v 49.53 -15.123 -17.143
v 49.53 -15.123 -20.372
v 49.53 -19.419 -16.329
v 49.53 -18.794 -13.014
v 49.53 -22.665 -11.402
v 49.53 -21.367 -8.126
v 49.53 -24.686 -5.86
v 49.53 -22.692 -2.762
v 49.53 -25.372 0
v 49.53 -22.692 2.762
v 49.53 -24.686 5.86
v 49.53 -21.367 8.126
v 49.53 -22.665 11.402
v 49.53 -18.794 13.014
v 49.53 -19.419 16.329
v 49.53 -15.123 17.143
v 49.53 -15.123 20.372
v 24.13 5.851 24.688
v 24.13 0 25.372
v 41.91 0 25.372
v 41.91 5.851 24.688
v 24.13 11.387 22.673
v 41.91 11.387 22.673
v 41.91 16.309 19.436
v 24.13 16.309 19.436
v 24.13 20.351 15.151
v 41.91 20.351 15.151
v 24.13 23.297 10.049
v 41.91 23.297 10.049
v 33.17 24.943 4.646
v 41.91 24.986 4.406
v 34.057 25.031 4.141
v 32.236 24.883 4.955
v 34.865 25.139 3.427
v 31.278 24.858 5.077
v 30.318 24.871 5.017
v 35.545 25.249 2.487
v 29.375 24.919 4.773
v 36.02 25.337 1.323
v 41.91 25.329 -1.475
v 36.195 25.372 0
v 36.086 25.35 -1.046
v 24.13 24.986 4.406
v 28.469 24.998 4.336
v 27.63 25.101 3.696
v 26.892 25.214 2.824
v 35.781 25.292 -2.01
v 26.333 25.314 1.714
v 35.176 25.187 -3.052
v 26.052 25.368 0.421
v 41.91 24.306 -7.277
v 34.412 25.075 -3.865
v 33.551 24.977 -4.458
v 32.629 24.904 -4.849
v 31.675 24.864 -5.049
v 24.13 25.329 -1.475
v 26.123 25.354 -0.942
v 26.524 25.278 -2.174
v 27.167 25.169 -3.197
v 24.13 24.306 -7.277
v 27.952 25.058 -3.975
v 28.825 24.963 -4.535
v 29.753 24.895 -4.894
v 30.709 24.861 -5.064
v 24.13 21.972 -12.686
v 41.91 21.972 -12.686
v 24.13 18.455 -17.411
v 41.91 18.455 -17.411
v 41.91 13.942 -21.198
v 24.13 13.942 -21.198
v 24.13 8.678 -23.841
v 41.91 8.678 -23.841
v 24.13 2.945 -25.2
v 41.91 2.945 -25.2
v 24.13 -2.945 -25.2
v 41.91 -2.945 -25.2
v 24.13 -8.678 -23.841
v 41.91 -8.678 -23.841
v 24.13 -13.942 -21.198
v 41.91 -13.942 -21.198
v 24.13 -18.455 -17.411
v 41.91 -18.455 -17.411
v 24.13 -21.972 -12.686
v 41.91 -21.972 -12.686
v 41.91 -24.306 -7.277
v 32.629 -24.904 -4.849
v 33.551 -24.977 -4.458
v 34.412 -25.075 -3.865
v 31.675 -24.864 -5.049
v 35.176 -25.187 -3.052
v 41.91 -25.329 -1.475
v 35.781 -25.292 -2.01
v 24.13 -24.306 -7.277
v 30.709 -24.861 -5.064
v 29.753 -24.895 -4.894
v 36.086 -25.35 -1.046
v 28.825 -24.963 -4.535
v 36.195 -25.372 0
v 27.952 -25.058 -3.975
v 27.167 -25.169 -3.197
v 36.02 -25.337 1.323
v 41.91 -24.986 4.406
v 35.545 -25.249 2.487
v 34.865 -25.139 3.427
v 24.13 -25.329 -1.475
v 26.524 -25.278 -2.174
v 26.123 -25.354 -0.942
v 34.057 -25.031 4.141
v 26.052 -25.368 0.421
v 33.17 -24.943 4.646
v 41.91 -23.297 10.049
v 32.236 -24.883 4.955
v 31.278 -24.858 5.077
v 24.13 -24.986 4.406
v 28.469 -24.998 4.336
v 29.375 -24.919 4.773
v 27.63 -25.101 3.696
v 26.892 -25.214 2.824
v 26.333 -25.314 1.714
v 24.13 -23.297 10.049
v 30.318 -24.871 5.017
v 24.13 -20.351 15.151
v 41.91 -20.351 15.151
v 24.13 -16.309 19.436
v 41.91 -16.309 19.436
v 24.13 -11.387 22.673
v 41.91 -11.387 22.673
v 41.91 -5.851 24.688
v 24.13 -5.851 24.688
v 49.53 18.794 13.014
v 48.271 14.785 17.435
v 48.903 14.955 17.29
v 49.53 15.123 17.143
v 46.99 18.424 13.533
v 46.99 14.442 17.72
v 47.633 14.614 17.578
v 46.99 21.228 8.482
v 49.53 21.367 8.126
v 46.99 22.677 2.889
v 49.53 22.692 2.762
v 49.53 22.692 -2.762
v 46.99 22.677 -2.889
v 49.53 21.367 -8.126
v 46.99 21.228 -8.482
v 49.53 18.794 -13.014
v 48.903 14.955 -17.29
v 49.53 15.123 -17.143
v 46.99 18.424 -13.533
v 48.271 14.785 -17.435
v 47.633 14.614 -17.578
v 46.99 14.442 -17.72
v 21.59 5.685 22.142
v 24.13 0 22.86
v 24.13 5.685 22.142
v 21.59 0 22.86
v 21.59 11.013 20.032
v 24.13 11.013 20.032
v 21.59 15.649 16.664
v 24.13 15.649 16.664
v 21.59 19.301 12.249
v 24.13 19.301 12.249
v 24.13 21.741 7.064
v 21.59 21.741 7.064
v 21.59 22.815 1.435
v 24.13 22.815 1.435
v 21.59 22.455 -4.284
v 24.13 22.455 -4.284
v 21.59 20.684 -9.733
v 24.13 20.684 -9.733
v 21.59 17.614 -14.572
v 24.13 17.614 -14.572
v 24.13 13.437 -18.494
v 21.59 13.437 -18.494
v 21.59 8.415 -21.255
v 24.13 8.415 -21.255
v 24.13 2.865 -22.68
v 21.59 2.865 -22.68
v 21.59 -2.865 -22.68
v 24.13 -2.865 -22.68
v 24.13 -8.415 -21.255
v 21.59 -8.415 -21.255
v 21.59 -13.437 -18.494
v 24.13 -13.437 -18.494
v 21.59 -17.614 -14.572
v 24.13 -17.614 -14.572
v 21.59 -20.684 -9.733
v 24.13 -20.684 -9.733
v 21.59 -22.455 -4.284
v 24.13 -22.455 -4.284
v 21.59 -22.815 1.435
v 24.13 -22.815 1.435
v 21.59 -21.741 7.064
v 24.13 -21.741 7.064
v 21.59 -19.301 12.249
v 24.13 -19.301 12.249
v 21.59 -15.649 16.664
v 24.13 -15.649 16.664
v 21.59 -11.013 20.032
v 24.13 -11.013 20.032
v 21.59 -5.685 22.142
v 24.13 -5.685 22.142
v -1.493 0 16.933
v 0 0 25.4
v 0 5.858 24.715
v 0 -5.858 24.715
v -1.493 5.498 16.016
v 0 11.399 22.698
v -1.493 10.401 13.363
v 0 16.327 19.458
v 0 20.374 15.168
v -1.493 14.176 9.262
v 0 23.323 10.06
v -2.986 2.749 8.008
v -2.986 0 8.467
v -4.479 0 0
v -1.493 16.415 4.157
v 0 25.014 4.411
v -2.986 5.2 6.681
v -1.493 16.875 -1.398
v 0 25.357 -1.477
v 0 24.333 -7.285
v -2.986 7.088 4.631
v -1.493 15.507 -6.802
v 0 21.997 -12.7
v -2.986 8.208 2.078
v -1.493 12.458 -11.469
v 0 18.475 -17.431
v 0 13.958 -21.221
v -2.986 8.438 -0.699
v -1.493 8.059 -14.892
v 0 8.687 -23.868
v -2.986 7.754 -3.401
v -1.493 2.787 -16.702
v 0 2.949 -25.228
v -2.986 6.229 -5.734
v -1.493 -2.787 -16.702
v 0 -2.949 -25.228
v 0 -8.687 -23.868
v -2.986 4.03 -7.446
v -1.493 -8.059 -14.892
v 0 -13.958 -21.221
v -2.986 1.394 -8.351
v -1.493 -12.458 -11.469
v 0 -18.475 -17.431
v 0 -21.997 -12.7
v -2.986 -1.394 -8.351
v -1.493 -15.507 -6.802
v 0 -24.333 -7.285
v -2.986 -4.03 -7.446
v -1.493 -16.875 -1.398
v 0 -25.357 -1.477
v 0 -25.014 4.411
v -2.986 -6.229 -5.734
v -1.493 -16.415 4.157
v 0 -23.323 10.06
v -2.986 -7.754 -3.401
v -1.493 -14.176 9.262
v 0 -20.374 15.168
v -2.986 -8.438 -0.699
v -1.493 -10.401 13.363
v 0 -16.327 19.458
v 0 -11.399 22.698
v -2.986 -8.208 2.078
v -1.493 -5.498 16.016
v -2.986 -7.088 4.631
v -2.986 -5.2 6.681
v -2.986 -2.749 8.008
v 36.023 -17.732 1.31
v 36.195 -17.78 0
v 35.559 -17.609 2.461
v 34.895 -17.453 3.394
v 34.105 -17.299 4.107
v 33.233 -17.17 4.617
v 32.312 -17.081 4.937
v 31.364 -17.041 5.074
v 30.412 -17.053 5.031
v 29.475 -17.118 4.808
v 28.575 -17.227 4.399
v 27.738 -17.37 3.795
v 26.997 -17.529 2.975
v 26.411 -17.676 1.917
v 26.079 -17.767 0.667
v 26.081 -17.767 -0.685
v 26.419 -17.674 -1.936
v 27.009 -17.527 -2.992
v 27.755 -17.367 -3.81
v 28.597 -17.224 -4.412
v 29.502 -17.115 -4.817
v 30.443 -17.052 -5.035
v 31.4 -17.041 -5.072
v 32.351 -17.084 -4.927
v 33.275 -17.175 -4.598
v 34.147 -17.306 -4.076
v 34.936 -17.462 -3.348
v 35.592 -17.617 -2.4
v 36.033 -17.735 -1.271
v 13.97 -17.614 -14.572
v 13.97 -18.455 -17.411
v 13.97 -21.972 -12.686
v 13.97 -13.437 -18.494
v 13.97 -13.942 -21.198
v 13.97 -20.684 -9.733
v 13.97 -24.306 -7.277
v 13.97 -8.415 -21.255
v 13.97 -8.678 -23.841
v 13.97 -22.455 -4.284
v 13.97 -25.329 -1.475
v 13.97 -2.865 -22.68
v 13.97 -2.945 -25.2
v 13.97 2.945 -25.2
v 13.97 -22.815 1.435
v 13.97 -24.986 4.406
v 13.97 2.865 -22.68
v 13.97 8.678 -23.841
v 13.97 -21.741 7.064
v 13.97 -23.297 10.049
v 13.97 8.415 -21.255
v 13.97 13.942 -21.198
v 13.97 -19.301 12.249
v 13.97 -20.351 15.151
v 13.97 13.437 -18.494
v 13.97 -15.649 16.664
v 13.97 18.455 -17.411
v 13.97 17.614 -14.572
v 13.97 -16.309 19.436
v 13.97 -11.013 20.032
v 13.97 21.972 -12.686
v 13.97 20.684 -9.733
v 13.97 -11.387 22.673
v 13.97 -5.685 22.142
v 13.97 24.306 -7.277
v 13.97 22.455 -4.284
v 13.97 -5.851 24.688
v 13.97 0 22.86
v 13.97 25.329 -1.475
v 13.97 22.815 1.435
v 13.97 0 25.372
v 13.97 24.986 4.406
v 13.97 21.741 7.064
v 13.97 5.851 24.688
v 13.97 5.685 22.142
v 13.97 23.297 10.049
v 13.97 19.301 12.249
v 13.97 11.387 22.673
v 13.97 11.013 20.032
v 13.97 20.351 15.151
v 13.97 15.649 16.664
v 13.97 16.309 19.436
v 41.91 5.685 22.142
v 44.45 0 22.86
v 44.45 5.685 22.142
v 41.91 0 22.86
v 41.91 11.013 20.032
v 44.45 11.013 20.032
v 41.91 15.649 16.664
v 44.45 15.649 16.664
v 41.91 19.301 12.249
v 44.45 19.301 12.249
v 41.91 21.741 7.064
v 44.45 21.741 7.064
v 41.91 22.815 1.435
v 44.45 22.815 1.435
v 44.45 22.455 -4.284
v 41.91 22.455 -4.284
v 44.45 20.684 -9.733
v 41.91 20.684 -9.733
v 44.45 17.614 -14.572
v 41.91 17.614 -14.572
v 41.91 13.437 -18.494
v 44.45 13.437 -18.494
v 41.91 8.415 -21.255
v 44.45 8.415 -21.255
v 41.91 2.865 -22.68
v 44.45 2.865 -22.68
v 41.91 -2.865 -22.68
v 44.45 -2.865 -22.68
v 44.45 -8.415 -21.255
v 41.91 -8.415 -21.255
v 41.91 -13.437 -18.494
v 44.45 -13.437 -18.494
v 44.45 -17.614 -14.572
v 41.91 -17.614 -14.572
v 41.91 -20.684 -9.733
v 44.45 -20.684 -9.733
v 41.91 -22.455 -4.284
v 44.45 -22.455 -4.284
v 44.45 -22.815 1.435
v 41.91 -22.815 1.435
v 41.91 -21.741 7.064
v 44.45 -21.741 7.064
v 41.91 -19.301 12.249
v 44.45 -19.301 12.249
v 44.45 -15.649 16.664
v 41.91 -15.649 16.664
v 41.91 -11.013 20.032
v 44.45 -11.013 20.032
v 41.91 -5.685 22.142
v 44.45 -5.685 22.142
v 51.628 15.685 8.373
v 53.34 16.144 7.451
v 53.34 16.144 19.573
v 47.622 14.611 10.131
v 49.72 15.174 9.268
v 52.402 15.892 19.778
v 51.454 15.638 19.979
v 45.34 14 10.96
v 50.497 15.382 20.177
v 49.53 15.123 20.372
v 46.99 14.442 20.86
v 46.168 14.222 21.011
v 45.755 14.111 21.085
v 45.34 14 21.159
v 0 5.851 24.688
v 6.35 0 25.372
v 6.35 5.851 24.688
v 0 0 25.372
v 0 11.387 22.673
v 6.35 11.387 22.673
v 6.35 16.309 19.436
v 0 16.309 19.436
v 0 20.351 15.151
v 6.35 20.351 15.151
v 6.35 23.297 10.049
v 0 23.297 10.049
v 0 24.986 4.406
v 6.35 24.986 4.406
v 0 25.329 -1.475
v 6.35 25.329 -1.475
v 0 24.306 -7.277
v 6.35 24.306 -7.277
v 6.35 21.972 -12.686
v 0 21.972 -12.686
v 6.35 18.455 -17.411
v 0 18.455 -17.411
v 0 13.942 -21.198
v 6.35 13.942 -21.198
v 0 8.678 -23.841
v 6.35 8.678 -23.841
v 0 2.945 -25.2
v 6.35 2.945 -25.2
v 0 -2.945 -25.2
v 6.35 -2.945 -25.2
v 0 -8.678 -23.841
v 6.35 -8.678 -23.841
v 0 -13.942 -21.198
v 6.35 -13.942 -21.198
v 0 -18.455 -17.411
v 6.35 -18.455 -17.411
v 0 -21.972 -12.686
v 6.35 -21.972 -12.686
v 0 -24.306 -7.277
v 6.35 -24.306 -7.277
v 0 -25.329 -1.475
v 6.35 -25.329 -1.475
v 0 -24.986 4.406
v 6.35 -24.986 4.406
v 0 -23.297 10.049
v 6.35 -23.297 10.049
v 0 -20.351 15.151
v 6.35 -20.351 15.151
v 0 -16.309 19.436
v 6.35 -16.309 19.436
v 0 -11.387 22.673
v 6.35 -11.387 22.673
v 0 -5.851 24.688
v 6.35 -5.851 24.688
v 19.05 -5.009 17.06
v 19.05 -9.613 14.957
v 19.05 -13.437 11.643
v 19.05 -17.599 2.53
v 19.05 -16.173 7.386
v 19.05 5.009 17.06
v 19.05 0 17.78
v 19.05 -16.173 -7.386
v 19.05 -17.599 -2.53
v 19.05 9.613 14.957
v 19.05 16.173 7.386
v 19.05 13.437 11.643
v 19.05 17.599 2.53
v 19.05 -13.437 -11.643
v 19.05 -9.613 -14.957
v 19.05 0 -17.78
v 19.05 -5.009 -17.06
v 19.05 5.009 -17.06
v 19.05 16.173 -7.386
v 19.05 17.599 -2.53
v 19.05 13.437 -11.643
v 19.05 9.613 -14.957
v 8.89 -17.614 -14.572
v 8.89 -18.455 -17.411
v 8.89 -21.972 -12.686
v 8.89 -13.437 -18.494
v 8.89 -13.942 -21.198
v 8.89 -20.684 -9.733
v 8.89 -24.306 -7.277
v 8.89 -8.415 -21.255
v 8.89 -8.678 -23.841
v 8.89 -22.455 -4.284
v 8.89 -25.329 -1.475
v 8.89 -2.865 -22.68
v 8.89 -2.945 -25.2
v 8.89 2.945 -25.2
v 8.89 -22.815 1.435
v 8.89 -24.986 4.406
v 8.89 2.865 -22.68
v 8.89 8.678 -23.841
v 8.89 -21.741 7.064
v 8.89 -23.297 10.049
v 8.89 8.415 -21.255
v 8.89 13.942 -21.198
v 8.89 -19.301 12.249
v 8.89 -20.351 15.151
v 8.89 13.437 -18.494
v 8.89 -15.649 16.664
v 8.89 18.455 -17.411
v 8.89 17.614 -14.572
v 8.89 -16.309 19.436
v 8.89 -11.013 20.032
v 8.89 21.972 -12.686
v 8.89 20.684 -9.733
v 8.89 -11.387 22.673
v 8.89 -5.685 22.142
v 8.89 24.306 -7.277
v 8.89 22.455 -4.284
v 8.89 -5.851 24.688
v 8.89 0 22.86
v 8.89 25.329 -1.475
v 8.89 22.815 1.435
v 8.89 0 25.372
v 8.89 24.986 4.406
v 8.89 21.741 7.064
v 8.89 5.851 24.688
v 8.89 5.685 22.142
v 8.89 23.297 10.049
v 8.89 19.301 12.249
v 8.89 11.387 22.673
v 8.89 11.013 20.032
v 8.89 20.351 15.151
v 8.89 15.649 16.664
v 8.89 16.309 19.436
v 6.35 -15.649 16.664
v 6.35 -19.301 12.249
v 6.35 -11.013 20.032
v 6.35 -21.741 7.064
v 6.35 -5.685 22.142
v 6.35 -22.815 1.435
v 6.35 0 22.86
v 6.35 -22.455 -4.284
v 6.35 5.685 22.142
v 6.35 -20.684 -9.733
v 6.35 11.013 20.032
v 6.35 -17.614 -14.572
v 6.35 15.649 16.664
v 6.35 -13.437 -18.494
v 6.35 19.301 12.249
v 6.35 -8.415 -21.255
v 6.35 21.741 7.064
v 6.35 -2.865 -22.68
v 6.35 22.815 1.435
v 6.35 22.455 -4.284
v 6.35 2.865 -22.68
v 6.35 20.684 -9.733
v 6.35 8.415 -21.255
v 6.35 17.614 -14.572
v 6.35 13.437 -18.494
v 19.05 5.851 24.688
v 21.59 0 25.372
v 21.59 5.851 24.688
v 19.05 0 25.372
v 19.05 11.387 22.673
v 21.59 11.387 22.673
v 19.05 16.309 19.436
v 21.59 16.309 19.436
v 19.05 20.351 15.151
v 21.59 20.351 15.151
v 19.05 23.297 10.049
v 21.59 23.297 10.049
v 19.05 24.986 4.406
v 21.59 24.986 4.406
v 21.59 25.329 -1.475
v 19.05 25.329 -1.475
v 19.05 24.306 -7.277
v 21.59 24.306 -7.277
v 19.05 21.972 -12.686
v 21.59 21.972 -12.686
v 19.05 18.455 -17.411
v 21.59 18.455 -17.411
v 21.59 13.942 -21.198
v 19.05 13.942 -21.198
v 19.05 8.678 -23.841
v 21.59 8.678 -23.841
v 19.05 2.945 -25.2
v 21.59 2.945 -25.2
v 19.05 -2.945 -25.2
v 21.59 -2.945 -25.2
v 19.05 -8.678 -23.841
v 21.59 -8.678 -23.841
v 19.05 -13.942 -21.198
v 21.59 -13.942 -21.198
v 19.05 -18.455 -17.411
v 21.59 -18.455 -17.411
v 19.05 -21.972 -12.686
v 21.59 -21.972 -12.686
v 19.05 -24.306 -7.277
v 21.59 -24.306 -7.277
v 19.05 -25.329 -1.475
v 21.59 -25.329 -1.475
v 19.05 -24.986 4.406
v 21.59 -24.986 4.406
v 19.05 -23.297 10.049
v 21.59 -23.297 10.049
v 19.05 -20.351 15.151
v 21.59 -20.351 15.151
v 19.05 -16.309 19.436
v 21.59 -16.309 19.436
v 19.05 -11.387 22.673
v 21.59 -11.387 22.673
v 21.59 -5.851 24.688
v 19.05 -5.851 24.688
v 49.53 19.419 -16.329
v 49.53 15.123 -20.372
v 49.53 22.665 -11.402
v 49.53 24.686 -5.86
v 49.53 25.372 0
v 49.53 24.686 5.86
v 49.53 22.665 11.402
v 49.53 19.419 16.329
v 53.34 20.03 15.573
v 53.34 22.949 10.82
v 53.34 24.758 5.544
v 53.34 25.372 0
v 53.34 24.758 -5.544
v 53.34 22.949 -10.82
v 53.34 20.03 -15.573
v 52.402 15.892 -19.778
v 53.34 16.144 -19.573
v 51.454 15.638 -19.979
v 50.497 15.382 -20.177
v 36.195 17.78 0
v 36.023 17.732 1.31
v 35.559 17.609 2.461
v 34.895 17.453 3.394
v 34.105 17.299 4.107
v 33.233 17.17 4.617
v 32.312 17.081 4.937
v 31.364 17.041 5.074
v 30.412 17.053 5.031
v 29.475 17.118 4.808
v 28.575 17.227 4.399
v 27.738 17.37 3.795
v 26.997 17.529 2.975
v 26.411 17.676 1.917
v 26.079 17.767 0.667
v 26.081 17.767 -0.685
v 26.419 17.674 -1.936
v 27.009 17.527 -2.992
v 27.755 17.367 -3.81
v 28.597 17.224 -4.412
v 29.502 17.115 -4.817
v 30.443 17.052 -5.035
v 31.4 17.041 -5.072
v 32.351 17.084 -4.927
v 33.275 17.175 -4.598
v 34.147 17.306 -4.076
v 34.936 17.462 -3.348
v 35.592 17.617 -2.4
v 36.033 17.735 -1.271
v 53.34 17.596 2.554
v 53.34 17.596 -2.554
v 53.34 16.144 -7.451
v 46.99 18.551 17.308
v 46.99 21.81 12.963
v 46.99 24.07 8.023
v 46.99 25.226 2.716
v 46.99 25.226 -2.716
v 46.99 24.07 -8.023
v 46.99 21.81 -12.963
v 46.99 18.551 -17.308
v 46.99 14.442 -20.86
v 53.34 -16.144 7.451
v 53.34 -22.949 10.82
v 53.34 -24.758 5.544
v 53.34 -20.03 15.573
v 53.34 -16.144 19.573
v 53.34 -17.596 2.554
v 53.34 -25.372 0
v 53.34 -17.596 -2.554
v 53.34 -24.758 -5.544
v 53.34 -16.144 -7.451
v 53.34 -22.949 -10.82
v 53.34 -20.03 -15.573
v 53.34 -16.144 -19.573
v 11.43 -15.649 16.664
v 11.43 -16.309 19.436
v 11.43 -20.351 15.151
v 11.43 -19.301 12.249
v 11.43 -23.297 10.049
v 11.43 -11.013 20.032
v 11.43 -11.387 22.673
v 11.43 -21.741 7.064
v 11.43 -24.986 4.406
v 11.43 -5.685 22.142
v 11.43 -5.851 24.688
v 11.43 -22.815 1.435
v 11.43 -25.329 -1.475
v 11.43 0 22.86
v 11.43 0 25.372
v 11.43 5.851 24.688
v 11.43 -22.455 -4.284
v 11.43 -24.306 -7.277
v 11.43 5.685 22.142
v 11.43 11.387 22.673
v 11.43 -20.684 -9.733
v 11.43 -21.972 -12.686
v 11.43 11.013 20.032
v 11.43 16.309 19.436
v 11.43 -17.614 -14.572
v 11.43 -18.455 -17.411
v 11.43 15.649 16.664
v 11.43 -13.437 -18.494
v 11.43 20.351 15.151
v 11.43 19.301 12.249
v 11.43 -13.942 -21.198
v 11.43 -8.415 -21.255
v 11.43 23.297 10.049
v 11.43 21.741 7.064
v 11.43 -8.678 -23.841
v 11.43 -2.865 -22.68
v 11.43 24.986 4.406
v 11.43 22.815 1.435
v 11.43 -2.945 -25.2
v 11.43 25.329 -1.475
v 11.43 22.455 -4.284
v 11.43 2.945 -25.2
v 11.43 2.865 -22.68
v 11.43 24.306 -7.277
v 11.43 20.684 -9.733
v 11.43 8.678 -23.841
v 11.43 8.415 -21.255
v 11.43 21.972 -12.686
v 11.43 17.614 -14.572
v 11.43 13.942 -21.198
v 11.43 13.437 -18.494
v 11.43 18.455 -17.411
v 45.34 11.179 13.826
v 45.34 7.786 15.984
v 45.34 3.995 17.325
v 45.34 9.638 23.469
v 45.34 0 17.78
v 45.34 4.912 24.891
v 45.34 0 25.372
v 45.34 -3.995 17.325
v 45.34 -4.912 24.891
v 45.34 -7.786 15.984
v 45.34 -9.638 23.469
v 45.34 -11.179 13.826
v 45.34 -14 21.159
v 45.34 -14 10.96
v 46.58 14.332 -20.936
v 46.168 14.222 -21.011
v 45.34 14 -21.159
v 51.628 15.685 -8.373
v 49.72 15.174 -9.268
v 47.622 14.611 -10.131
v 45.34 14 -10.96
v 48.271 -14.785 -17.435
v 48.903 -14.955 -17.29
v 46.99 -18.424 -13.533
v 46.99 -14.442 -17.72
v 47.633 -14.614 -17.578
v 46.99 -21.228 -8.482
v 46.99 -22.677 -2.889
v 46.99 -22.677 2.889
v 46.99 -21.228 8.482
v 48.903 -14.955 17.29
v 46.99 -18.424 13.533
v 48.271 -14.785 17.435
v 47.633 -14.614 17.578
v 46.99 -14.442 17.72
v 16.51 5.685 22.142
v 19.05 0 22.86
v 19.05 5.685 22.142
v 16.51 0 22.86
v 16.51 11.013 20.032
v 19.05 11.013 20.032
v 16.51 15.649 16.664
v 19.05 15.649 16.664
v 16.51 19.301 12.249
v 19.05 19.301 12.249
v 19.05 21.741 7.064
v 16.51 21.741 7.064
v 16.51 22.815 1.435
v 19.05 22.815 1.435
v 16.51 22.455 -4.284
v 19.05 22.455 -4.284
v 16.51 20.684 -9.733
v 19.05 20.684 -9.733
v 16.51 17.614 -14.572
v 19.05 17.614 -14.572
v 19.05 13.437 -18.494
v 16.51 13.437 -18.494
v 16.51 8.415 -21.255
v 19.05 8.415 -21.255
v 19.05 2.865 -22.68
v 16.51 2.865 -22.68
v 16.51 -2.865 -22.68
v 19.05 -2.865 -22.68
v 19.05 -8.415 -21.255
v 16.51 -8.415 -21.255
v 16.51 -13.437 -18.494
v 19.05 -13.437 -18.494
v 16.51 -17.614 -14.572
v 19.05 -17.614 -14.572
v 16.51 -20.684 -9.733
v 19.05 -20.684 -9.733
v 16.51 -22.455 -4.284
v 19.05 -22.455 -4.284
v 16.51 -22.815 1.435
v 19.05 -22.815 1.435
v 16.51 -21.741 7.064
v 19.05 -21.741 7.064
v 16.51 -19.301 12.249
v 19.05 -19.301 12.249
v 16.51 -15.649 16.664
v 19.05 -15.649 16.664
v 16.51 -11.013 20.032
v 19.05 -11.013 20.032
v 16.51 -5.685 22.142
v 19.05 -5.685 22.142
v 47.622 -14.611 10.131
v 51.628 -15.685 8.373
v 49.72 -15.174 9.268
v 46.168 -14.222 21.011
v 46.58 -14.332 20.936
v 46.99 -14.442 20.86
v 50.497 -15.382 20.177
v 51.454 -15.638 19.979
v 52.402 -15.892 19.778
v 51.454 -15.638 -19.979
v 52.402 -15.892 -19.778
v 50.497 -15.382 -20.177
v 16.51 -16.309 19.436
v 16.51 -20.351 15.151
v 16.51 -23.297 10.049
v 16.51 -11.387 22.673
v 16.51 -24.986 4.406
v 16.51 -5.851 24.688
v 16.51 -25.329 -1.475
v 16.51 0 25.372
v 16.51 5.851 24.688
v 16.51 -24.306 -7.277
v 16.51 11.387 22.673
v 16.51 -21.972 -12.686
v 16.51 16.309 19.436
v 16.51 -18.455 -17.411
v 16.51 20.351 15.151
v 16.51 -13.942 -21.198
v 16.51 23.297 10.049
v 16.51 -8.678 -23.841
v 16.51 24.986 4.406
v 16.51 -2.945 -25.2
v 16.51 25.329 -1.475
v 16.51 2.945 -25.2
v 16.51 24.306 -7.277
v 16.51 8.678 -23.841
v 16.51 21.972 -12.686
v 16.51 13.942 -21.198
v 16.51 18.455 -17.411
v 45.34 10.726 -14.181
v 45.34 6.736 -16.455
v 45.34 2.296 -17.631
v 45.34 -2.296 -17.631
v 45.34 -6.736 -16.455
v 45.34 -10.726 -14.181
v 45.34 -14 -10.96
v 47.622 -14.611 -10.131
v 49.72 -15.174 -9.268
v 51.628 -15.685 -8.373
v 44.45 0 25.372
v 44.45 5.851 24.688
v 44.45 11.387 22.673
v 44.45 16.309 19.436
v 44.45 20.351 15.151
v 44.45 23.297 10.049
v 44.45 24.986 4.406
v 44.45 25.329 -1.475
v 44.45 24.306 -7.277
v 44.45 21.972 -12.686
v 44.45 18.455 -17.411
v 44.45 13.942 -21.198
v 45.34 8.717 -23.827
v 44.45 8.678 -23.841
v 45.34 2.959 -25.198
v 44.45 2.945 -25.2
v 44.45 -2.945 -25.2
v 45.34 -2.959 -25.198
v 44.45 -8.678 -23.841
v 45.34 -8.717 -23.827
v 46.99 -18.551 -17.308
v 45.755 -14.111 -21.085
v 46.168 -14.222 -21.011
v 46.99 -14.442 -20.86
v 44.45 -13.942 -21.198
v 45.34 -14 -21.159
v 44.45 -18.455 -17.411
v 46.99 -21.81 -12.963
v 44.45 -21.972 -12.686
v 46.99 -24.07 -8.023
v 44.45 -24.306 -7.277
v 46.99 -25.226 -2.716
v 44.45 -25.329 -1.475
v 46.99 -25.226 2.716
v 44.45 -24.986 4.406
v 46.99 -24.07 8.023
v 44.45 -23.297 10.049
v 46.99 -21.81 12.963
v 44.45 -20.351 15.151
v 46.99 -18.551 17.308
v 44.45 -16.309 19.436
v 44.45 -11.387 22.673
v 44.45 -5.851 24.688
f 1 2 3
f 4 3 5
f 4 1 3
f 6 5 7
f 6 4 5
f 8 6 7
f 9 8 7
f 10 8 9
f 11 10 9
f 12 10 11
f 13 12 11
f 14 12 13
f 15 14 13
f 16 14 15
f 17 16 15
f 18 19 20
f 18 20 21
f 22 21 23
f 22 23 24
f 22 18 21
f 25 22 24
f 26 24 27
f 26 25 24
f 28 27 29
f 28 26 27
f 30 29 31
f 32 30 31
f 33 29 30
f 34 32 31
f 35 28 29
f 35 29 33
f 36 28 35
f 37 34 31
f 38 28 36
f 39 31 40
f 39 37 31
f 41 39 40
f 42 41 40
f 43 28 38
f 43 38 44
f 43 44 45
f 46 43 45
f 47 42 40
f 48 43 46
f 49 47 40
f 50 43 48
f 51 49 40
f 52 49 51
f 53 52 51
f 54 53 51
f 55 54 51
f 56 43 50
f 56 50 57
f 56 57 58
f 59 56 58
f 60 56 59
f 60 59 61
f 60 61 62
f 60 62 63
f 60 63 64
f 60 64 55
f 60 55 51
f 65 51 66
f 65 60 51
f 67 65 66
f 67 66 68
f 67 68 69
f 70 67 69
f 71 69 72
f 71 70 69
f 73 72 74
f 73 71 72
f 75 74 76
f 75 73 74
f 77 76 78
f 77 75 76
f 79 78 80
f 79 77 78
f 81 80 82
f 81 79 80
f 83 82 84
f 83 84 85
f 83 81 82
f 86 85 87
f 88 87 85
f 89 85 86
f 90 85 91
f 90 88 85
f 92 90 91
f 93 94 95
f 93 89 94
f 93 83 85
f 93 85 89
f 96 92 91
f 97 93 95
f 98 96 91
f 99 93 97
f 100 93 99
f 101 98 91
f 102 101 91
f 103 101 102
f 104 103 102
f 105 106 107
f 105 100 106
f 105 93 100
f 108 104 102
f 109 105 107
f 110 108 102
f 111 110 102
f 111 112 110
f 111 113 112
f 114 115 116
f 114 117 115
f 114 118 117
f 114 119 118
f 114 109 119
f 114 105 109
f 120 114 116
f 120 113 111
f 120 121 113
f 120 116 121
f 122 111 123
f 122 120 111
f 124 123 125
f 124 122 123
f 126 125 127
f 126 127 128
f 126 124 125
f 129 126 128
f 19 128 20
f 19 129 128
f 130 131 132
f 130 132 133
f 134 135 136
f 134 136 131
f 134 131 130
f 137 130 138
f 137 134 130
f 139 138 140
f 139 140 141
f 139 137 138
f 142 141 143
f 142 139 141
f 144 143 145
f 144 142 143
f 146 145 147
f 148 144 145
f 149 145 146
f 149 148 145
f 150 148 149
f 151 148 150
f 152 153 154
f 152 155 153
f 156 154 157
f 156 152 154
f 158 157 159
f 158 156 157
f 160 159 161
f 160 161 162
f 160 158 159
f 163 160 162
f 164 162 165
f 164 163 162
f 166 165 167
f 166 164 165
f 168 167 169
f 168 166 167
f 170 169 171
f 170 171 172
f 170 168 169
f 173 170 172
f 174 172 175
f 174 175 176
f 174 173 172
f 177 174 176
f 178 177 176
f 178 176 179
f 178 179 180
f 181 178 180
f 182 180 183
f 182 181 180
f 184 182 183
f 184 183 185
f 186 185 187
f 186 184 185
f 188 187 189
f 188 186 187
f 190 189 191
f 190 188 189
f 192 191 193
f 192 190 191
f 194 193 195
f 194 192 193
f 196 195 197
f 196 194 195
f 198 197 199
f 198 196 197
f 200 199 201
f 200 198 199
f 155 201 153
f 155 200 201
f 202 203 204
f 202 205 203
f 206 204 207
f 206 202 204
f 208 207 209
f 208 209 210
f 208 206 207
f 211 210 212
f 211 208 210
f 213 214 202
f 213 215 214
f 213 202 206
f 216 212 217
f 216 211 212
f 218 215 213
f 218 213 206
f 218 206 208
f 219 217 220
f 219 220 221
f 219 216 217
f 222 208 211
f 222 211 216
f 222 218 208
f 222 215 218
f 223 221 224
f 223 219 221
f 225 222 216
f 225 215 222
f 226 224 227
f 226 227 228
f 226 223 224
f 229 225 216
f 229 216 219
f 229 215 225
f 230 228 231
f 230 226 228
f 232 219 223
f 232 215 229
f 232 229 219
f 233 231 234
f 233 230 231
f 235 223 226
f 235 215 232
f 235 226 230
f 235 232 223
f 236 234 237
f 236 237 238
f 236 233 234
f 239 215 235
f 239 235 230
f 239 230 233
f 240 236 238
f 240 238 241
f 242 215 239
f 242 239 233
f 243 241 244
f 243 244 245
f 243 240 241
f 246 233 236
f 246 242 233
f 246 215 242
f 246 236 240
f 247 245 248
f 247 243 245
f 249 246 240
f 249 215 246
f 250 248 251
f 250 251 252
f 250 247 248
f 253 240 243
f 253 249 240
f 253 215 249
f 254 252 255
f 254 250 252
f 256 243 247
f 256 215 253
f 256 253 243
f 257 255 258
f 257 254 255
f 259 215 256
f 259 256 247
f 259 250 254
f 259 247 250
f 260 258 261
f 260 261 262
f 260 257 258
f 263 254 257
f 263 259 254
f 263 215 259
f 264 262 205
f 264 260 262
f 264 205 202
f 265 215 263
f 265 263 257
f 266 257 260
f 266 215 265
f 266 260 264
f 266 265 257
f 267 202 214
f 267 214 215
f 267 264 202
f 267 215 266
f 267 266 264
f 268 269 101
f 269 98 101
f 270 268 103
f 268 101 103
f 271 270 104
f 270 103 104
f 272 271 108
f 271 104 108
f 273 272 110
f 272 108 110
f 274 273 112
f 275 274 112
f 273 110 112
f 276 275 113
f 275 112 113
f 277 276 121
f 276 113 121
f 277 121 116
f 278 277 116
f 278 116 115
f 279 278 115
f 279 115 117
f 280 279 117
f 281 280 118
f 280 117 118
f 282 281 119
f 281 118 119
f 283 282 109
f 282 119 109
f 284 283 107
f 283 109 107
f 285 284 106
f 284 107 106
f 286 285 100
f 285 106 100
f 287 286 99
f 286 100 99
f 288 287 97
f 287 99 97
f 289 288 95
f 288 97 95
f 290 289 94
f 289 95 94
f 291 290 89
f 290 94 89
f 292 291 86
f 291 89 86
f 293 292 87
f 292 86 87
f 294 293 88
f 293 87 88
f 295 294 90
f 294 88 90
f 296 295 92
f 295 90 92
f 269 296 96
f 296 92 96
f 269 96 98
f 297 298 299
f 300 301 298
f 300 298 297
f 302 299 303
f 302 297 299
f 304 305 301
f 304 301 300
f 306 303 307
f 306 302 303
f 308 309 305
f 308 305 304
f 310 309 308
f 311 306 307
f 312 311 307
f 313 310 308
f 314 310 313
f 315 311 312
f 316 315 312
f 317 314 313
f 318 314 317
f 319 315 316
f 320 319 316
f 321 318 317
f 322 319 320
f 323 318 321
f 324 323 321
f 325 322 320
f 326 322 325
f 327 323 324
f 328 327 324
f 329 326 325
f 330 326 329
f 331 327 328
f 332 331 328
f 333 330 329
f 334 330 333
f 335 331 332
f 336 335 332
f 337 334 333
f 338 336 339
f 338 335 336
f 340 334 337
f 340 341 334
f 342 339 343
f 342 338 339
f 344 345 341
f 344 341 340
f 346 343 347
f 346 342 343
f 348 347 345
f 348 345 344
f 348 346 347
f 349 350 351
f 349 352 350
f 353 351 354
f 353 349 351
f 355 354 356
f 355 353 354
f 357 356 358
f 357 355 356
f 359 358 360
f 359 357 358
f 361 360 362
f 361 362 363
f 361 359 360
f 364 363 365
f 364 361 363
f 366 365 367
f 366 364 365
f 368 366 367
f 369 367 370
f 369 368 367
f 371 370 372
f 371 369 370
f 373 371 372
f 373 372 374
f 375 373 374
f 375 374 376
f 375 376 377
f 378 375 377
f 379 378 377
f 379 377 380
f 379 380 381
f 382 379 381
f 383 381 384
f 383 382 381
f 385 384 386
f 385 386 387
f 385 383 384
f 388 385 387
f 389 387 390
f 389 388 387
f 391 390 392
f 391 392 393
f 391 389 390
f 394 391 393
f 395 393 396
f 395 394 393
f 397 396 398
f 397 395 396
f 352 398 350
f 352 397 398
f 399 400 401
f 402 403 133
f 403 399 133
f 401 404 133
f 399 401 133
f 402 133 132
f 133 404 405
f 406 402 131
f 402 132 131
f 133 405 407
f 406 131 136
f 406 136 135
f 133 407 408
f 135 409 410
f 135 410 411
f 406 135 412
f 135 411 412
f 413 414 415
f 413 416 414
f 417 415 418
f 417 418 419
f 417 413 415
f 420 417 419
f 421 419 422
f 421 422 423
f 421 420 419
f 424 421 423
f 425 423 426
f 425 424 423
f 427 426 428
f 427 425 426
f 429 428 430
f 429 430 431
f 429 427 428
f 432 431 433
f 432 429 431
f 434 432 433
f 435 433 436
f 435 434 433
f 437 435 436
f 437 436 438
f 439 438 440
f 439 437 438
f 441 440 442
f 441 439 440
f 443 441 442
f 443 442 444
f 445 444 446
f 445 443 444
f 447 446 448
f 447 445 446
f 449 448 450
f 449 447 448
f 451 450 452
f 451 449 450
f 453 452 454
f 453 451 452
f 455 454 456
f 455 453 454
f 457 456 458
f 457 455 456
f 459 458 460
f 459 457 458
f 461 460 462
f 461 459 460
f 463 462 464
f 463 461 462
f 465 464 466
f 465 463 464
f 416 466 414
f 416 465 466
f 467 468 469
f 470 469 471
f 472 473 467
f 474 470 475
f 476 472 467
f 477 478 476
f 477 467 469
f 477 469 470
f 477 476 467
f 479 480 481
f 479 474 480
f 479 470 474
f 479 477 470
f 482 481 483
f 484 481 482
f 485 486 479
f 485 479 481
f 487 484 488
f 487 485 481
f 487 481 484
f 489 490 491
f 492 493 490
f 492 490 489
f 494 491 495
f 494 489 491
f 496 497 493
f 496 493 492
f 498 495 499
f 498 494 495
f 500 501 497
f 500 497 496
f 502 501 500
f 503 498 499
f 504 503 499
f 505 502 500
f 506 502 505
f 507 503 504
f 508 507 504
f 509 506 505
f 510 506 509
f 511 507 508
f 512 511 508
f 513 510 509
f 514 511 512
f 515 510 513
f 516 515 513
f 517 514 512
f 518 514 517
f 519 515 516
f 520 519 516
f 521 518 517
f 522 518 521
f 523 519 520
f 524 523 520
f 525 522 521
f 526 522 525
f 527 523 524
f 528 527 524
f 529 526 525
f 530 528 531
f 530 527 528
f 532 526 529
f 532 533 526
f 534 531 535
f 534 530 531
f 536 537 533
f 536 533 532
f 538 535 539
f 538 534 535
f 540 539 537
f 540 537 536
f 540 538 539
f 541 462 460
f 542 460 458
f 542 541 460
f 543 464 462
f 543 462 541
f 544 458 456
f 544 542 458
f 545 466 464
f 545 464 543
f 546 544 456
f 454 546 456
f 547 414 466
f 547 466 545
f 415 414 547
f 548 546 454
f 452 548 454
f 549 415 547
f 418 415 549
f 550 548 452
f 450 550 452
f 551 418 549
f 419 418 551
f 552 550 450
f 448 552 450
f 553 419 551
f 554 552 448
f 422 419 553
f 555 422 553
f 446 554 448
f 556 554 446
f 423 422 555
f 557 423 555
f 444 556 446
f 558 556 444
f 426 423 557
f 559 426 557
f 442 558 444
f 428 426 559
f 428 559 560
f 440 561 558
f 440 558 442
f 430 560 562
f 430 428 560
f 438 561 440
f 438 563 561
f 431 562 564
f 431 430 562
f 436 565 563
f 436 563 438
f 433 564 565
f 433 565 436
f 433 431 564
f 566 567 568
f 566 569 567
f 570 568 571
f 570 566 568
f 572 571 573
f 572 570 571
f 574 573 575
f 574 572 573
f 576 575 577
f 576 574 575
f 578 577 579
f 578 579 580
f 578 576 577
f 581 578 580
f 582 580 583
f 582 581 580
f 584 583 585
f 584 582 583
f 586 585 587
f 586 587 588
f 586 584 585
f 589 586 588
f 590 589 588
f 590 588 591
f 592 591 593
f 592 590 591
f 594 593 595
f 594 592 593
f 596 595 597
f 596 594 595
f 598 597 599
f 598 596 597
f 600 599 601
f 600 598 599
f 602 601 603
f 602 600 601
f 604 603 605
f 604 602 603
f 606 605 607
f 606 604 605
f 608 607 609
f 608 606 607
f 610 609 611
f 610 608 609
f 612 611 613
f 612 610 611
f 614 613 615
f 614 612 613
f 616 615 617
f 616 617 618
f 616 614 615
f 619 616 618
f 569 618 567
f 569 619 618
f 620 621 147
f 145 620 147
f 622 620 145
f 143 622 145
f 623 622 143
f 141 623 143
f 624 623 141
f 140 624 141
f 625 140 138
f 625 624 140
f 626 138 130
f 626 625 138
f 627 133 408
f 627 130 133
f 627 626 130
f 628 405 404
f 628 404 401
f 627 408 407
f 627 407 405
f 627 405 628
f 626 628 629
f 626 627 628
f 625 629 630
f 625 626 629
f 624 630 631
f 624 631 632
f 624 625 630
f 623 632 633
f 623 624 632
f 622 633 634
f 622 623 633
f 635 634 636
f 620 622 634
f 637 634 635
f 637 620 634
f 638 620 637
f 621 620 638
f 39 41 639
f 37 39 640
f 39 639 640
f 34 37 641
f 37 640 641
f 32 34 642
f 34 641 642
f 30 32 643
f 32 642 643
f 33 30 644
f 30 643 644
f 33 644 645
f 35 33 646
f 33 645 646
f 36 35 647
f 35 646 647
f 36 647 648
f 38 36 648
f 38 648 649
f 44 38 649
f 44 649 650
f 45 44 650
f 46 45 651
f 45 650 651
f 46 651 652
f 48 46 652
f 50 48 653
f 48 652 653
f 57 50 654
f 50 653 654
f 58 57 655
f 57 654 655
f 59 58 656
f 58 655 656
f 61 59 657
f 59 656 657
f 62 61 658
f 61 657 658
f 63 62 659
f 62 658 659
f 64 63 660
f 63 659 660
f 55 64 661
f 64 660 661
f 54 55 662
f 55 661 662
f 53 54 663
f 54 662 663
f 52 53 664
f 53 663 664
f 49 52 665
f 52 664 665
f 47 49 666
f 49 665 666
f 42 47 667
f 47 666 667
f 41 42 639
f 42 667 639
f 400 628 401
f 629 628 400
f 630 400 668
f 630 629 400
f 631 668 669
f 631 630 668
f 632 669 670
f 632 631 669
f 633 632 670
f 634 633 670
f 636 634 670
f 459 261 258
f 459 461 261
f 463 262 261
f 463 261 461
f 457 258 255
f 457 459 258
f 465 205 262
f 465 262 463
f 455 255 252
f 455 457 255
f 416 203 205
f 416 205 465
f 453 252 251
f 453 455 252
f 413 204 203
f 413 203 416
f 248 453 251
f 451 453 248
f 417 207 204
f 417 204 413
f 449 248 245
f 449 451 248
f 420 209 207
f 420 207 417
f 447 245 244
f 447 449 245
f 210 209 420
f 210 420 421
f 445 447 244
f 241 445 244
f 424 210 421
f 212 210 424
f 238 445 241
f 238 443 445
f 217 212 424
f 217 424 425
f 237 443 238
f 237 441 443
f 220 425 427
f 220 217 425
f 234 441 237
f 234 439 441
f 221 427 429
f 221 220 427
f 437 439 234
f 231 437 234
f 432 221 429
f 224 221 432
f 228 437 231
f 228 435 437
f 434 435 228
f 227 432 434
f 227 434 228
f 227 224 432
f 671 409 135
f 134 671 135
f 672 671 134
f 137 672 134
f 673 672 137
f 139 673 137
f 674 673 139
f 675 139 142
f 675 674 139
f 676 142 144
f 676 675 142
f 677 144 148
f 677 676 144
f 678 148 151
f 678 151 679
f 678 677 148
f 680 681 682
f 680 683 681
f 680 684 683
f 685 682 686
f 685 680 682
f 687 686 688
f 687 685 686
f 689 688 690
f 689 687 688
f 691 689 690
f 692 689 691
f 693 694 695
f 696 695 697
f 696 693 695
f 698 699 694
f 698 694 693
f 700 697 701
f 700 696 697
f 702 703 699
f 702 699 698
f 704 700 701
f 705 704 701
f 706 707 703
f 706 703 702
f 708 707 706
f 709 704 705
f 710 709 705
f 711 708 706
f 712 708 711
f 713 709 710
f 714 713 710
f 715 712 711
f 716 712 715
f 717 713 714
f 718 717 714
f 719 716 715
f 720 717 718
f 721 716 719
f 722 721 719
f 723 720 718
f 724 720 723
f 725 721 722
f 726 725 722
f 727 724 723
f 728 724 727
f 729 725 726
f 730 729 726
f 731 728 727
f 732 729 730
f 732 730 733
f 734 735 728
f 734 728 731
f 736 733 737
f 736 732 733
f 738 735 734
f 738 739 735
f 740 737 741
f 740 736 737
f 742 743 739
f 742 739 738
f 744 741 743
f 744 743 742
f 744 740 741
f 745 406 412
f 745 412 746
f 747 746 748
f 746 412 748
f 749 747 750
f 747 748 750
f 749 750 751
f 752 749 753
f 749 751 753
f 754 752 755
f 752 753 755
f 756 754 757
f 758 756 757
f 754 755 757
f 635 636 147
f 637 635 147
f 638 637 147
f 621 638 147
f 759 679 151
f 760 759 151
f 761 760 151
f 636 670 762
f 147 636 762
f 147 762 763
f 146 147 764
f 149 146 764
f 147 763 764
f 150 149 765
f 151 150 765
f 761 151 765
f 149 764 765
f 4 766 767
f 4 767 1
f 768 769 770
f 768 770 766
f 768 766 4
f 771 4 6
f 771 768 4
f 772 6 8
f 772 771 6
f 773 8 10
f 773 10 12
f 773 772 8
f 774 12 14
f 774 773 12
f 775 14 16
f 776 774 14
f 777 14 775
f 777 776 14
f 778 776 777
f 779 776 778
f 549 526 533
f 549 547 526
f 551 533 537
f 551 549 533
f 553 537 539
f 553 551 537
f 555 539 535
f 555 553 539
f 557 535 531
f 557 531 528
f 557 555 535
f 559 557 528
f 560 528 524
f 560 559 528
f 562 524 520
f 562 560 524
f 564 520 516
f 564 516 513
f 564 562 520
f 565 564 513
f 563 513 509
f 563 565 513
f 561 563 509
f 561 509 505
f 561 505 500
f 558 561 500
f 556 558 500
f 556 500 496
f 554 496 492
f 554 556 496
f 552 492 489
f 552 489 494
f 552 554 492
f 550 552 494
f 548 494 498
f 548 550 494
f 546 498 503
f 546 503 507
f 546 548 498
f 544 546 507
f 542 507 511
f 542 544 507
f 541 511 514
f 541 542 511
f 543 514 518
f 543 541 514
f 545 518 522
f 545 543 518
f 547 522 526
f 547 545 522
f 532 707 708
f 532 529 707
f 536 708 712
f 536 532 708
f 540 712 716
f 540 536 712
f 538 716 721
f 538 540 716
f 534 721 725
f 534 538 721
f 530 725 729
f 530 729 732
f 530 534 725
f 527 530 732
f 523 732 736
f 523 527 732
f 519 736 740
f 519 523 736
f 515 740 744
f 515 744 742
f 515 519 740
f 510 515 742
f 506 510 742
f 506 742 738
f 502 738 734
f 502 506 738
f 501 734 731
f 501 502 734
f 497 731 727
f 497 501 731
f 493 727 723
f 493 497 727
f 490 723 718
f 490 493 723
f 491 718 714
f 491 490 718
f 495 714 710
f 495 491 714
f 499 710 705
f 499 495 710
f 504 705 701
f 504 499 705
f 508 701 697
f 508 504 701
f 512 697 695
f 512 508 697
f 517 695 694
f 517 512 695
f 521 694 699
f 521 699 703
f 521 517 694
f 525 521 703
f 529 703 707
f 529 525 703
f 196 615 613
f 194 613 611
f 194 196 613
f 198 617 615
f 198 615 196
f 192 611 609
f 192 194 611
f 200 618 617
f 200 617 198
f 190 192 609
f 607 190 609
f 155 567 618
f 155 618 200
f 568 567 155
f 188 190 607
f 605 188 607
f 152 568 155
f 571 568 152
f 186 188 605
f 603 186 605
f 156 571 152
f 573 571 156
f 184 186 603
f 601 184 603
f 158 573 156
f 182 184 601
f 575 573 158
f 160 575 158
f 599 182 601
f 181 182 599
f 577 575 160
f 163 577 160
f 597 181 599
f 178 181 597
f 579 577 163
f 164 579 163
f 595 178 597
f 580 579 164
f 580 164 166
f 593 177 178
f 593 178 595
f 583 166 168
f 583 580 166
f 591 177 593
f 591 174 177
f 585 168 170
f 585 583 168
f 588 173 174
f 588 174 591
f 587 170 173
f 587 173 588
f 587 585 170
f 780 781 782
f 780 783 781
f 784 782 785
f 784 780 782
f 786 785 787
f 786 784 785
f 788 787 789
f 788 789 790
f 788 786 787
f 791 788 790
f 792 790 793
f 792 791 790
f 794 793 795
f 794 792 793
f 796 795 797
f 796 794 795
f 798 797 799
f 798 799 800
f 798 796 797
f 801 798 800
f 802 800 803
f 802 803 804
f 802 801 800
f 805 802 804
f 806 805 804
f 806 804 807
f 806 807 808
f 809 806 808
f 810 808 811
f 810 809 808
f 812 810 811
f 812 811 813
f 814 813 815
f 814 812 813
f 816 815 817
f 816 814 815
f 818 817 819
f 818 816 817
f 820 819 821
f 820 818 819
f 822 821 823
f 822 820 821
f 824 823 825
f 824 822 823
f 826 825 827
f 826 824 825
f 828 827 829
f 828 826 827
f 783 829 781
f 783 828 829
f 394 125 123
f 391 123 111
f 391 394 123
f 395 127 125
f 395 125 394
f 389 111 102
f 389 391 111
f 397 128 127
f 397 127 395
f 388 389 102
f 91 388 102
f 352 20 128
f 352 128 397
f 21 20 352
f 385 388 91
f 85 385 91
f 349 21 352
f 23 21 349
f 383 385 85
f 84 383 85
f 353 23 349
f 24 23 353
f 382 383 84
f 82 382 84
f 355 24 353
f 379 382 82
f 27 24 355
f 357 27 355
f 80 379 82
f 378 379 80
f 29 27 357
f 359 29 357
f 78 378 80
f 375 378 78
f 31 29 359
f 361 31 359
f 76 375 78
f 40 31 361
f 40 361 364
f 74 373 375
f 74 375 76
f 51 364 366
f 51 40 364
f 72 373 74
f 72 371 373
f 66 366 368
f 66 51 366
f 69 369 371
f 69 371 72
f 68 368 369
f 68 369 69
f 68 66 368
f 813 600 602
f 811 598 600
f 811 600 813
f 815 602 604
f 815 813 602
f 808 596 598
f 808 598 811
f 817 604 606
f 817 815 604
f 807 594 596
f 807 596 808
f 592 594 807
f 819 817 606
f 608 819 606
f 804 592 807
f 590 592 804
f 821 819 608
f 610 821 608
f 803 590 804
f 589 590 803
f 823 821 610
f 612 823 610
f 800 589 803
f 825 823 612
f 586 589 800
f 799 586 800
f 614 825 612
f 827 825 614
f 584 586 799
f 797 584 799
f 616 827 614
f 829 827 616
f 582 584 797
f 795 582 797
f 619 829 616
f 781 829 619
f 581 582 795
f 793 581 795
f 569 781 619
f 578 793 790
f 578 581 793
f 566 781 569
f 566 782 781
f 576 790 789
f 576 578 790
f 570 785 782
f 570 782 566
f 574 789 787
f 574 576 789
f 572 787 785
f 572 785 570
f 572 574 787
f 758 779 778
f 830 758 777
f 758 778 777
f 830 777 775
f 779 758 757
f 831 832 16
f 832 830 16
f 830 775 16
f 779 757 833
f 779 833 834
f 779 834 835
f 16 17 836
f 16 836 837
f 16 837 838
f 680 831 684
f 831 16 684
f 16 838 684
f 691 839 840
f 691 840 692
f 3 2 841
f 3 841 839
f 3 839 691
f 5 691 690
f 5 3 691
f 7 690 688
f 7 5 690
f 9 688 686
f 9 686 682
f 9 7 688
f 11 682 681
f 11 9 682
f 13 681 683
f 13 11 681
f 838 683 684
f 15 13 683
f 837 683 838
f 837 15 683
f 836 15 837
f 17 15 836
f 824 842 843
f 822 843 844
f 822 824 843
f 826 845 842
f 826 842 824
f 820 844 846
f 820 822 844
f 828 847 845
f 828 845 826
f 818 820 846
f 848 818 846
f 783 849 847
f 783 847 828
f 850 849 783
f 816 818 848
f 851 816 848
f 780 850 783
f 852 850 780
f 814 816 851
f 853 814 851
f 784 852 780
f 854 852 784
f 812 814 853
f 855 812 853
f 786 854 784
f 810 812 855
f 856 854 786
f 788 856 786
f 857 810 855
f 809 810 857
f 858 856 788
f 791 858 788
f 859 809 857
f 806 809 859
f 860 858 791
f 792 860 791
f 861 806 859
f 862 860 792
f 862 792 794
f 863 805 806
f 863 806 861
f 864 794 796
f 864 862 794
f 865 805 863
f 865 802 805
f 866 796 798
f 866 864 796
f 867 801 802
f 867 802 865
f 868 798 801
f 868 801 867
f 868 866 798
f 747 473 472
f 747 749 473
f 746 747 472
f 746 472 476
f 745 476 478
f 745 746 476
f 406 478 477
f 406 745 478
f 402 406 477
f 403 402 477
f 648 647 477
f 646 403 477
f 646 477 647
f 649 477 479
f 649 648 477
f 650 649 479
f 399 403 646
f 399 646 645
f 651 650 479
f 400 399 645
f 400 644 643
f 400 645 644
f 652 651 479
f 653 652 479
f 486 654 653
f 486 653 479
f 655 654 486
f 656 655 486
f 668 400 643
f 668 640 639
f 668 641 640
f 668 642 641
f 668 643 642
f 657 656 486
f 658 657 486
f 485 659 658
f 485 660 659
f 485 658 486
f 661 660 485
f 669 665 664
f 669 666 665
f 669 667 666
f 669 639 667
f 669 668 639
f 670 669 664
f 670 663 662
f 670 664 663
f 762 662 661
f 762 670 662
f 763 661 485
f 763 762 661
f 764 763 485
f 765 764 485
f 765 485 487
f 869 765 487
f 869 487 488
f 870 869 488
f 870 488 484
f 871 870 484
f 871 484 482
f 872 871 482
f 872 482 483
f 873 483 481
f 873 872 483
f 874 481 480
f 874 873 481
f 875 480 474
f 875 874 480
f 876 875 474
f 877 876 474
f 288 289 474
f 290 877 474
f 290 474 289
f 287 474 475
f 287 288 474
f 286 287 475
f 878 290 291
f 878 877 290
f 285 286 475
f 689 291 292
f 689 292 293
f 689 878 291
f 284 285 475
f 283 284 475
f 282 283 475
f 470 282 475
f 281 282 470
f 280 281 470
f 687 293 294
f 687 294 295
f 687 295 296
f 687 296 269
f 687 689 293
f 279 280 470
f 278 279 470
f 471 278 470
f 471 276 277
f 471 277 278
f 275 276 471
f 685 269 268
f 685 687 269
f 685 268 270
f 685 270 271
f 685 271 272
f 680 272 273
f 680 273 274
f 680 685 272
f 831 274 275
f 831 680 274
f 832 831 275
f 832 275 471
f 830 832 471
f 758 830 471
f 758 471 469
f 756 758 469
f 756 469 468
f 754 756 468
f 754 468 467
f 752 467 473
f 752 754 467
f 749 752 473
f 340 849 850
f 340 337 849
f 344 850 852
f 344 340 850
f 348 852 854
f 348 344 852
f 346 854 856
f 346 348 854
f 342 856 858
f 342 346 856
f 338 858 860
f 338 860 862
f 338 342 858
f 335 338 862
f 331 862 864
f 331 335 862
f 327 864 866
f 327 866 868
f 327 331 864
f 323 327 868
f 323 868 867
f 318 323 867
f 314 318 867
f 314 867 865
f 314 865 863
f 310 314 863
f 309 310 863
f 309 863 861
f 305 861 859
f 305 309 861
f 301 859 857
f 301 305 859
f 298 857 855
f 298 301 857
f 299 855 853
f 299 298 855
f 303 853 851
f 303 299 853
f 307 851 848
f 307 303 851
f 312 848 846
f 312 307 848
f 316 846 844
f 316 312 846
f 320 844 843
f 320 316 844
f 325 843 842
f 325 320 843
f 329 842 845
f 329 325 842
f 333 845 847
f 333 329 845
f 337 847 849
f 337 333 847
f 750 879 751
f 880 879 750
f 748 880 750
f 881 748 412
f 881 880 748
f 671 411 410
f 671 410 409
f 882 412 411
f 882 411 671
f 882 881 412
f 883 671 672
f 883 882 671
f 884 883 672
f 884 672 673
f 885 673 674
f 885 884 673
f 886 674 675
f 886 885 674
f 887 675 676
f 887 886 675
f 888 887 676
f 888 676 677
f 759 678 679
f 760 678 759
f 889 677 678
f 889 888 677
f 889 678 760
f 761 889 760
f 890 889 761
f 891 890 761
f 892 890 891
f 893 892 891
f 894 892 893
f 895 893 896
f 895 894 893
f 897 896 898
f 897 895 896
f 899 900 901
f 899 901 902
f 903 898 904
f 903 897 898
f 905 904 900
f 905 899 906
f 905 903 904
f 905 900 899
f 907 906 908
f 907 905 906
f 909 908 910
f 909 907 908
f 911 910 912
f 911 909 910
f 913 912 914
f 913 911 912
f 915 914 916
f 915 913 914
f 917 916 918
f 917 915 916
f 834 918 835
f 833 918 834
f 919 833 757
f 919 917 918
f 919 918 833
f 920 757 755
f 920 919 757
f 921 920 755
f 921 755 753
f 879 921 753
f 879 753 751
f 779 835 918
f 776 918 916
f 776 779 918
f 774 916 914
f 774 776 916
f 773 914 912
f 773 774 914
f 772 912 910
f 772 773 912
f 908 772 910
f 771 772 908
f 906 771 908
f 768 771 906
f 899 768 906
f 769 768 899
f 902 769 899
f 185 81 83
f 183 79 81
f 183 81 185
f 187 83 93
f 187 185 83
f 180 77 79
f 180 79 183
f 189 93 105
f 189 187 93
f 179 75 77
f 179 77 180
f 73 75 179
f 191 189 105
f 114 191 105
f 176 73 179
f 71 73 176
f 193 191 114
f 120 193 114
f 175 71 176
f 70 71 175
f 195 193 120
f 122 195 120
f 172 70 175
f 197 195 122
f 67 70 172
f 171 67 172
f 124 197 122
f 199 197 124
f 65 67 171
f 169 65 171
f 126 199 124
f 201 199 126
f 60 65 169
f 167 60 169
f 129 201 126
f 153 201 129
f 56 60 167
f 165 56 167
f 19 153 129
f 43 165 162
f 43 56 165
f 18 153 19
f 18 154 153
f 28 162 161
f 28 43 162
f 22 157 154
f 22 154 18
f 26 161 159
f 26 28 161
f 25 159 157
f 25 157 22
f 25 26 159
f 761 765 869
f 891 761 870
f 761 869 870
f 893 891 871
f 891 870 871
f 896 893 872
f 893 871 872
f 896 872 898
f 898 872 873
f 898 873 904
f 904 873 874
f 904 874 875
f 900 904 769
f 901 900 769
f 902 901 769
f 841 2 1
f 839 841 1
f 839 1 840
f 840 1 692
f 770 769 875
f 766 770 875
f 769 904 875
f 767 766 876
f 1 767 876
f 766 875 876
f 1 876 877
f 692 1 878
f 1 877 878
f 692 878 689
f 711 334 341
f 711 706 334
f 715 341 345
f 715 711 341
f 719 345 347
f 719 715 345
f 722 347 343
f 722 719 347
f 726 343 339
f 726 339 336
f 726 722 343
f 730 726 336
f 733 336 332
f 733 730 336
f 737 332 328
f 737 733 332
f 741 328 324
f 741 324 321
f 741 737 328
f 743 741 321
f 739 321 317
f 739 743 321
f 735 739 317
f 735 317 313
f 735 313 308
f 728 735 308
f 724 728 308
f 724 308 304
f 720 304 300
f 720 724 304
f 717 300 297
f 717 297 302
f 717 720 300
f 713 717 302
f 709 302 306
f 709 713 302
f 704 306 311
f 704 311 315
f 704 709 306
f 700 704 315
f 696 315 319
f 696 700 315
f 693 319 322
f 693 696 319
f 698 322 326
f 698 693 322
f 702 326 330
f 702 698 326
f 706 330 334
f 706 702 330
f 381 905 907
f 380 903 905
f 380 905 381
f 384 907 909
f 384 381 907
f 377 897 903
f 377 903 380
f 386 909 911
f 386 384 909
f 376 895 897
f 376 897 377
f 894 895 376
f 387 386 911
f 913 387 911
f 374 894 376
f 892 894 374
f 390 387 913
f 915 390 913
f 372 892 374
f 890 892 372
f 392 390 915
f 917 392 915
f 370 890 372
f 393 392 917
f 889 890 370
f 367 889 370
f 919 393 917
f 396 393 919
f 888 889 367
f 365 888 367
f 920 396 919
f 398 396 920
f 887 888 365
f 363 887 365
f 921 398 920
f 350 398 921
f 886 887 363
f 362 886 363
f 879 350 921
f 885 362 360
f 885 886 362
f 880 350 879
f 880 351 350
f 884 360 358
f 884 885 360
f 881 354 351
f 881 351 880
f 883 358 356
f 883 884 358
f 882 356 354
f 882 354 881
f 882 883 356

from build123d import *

# Parameters (mm, degrees)
F2_R     = 5.08
F3_DEPTH = 63.5
F5_DEPTH = 50


with BuildPart() as f1:
    # F0 (on Front) → F1 (revolve)
    with BuildSketch(Plane.XZ):
        Polygon((0, 25.3715255082), (0, 0), (19.05, 0), (19.05, 17.78), (53.34, 17.78), (53.34, 25.3715255082), (49.53, 25.3715255082), (49.53, 22.86), (46.99, 22.86), (46.99, 25.3715255082), (44.45, 25.3715255082), (44.45, 22.86), (41.91, 22.86), (41.91, 25.3715255082), (24.13, 25.3715255082), (24.13, 22.86), (21.59, 22.86), (21.59, 25.3715255082), (19.05, 25.3715255082), (19.05, 22.86), (16.51, 22.86), (16.51, 25.3715255082), (13.97, 25.3715255082), (13.97, 22.86), (11.43, 22.86), (11.43, 25.3715255082), (8.89, 25.3715255082), (8.89, 22.86), (6.35, 22.86), (6.35, 25.3715255082), align=None)
        Polygon((-4.47870531, 0), (0, 0), (0, 25.3715255082), (0, 25.4), align=None)
    revolve(axis=Axis((9.525, 0, 0), (-1, 0, 0)))

    # F2 (on Front) → F3 (cut, symmetric)
    with BuildSketch(Plane.XZ):
        with Locations((31.115, 0)):
            Circle(F2_R)
    extrude(amount=F3_DEPTH, both=True, mode=Mode.SUBTRACT)

    # F4 (on Top) → F5 (cut, symmetric)
    with BuildSketch(Plane.XY):
        Polygon((53.34, -16.1435935394), (53.34, 16.1435935394), (45.34, 14), (45.34, -14), align=None)
    extrude(amount=F5_DEPTH, both=True, mode=Mode.SUBTRACT)


solid = f1.part
